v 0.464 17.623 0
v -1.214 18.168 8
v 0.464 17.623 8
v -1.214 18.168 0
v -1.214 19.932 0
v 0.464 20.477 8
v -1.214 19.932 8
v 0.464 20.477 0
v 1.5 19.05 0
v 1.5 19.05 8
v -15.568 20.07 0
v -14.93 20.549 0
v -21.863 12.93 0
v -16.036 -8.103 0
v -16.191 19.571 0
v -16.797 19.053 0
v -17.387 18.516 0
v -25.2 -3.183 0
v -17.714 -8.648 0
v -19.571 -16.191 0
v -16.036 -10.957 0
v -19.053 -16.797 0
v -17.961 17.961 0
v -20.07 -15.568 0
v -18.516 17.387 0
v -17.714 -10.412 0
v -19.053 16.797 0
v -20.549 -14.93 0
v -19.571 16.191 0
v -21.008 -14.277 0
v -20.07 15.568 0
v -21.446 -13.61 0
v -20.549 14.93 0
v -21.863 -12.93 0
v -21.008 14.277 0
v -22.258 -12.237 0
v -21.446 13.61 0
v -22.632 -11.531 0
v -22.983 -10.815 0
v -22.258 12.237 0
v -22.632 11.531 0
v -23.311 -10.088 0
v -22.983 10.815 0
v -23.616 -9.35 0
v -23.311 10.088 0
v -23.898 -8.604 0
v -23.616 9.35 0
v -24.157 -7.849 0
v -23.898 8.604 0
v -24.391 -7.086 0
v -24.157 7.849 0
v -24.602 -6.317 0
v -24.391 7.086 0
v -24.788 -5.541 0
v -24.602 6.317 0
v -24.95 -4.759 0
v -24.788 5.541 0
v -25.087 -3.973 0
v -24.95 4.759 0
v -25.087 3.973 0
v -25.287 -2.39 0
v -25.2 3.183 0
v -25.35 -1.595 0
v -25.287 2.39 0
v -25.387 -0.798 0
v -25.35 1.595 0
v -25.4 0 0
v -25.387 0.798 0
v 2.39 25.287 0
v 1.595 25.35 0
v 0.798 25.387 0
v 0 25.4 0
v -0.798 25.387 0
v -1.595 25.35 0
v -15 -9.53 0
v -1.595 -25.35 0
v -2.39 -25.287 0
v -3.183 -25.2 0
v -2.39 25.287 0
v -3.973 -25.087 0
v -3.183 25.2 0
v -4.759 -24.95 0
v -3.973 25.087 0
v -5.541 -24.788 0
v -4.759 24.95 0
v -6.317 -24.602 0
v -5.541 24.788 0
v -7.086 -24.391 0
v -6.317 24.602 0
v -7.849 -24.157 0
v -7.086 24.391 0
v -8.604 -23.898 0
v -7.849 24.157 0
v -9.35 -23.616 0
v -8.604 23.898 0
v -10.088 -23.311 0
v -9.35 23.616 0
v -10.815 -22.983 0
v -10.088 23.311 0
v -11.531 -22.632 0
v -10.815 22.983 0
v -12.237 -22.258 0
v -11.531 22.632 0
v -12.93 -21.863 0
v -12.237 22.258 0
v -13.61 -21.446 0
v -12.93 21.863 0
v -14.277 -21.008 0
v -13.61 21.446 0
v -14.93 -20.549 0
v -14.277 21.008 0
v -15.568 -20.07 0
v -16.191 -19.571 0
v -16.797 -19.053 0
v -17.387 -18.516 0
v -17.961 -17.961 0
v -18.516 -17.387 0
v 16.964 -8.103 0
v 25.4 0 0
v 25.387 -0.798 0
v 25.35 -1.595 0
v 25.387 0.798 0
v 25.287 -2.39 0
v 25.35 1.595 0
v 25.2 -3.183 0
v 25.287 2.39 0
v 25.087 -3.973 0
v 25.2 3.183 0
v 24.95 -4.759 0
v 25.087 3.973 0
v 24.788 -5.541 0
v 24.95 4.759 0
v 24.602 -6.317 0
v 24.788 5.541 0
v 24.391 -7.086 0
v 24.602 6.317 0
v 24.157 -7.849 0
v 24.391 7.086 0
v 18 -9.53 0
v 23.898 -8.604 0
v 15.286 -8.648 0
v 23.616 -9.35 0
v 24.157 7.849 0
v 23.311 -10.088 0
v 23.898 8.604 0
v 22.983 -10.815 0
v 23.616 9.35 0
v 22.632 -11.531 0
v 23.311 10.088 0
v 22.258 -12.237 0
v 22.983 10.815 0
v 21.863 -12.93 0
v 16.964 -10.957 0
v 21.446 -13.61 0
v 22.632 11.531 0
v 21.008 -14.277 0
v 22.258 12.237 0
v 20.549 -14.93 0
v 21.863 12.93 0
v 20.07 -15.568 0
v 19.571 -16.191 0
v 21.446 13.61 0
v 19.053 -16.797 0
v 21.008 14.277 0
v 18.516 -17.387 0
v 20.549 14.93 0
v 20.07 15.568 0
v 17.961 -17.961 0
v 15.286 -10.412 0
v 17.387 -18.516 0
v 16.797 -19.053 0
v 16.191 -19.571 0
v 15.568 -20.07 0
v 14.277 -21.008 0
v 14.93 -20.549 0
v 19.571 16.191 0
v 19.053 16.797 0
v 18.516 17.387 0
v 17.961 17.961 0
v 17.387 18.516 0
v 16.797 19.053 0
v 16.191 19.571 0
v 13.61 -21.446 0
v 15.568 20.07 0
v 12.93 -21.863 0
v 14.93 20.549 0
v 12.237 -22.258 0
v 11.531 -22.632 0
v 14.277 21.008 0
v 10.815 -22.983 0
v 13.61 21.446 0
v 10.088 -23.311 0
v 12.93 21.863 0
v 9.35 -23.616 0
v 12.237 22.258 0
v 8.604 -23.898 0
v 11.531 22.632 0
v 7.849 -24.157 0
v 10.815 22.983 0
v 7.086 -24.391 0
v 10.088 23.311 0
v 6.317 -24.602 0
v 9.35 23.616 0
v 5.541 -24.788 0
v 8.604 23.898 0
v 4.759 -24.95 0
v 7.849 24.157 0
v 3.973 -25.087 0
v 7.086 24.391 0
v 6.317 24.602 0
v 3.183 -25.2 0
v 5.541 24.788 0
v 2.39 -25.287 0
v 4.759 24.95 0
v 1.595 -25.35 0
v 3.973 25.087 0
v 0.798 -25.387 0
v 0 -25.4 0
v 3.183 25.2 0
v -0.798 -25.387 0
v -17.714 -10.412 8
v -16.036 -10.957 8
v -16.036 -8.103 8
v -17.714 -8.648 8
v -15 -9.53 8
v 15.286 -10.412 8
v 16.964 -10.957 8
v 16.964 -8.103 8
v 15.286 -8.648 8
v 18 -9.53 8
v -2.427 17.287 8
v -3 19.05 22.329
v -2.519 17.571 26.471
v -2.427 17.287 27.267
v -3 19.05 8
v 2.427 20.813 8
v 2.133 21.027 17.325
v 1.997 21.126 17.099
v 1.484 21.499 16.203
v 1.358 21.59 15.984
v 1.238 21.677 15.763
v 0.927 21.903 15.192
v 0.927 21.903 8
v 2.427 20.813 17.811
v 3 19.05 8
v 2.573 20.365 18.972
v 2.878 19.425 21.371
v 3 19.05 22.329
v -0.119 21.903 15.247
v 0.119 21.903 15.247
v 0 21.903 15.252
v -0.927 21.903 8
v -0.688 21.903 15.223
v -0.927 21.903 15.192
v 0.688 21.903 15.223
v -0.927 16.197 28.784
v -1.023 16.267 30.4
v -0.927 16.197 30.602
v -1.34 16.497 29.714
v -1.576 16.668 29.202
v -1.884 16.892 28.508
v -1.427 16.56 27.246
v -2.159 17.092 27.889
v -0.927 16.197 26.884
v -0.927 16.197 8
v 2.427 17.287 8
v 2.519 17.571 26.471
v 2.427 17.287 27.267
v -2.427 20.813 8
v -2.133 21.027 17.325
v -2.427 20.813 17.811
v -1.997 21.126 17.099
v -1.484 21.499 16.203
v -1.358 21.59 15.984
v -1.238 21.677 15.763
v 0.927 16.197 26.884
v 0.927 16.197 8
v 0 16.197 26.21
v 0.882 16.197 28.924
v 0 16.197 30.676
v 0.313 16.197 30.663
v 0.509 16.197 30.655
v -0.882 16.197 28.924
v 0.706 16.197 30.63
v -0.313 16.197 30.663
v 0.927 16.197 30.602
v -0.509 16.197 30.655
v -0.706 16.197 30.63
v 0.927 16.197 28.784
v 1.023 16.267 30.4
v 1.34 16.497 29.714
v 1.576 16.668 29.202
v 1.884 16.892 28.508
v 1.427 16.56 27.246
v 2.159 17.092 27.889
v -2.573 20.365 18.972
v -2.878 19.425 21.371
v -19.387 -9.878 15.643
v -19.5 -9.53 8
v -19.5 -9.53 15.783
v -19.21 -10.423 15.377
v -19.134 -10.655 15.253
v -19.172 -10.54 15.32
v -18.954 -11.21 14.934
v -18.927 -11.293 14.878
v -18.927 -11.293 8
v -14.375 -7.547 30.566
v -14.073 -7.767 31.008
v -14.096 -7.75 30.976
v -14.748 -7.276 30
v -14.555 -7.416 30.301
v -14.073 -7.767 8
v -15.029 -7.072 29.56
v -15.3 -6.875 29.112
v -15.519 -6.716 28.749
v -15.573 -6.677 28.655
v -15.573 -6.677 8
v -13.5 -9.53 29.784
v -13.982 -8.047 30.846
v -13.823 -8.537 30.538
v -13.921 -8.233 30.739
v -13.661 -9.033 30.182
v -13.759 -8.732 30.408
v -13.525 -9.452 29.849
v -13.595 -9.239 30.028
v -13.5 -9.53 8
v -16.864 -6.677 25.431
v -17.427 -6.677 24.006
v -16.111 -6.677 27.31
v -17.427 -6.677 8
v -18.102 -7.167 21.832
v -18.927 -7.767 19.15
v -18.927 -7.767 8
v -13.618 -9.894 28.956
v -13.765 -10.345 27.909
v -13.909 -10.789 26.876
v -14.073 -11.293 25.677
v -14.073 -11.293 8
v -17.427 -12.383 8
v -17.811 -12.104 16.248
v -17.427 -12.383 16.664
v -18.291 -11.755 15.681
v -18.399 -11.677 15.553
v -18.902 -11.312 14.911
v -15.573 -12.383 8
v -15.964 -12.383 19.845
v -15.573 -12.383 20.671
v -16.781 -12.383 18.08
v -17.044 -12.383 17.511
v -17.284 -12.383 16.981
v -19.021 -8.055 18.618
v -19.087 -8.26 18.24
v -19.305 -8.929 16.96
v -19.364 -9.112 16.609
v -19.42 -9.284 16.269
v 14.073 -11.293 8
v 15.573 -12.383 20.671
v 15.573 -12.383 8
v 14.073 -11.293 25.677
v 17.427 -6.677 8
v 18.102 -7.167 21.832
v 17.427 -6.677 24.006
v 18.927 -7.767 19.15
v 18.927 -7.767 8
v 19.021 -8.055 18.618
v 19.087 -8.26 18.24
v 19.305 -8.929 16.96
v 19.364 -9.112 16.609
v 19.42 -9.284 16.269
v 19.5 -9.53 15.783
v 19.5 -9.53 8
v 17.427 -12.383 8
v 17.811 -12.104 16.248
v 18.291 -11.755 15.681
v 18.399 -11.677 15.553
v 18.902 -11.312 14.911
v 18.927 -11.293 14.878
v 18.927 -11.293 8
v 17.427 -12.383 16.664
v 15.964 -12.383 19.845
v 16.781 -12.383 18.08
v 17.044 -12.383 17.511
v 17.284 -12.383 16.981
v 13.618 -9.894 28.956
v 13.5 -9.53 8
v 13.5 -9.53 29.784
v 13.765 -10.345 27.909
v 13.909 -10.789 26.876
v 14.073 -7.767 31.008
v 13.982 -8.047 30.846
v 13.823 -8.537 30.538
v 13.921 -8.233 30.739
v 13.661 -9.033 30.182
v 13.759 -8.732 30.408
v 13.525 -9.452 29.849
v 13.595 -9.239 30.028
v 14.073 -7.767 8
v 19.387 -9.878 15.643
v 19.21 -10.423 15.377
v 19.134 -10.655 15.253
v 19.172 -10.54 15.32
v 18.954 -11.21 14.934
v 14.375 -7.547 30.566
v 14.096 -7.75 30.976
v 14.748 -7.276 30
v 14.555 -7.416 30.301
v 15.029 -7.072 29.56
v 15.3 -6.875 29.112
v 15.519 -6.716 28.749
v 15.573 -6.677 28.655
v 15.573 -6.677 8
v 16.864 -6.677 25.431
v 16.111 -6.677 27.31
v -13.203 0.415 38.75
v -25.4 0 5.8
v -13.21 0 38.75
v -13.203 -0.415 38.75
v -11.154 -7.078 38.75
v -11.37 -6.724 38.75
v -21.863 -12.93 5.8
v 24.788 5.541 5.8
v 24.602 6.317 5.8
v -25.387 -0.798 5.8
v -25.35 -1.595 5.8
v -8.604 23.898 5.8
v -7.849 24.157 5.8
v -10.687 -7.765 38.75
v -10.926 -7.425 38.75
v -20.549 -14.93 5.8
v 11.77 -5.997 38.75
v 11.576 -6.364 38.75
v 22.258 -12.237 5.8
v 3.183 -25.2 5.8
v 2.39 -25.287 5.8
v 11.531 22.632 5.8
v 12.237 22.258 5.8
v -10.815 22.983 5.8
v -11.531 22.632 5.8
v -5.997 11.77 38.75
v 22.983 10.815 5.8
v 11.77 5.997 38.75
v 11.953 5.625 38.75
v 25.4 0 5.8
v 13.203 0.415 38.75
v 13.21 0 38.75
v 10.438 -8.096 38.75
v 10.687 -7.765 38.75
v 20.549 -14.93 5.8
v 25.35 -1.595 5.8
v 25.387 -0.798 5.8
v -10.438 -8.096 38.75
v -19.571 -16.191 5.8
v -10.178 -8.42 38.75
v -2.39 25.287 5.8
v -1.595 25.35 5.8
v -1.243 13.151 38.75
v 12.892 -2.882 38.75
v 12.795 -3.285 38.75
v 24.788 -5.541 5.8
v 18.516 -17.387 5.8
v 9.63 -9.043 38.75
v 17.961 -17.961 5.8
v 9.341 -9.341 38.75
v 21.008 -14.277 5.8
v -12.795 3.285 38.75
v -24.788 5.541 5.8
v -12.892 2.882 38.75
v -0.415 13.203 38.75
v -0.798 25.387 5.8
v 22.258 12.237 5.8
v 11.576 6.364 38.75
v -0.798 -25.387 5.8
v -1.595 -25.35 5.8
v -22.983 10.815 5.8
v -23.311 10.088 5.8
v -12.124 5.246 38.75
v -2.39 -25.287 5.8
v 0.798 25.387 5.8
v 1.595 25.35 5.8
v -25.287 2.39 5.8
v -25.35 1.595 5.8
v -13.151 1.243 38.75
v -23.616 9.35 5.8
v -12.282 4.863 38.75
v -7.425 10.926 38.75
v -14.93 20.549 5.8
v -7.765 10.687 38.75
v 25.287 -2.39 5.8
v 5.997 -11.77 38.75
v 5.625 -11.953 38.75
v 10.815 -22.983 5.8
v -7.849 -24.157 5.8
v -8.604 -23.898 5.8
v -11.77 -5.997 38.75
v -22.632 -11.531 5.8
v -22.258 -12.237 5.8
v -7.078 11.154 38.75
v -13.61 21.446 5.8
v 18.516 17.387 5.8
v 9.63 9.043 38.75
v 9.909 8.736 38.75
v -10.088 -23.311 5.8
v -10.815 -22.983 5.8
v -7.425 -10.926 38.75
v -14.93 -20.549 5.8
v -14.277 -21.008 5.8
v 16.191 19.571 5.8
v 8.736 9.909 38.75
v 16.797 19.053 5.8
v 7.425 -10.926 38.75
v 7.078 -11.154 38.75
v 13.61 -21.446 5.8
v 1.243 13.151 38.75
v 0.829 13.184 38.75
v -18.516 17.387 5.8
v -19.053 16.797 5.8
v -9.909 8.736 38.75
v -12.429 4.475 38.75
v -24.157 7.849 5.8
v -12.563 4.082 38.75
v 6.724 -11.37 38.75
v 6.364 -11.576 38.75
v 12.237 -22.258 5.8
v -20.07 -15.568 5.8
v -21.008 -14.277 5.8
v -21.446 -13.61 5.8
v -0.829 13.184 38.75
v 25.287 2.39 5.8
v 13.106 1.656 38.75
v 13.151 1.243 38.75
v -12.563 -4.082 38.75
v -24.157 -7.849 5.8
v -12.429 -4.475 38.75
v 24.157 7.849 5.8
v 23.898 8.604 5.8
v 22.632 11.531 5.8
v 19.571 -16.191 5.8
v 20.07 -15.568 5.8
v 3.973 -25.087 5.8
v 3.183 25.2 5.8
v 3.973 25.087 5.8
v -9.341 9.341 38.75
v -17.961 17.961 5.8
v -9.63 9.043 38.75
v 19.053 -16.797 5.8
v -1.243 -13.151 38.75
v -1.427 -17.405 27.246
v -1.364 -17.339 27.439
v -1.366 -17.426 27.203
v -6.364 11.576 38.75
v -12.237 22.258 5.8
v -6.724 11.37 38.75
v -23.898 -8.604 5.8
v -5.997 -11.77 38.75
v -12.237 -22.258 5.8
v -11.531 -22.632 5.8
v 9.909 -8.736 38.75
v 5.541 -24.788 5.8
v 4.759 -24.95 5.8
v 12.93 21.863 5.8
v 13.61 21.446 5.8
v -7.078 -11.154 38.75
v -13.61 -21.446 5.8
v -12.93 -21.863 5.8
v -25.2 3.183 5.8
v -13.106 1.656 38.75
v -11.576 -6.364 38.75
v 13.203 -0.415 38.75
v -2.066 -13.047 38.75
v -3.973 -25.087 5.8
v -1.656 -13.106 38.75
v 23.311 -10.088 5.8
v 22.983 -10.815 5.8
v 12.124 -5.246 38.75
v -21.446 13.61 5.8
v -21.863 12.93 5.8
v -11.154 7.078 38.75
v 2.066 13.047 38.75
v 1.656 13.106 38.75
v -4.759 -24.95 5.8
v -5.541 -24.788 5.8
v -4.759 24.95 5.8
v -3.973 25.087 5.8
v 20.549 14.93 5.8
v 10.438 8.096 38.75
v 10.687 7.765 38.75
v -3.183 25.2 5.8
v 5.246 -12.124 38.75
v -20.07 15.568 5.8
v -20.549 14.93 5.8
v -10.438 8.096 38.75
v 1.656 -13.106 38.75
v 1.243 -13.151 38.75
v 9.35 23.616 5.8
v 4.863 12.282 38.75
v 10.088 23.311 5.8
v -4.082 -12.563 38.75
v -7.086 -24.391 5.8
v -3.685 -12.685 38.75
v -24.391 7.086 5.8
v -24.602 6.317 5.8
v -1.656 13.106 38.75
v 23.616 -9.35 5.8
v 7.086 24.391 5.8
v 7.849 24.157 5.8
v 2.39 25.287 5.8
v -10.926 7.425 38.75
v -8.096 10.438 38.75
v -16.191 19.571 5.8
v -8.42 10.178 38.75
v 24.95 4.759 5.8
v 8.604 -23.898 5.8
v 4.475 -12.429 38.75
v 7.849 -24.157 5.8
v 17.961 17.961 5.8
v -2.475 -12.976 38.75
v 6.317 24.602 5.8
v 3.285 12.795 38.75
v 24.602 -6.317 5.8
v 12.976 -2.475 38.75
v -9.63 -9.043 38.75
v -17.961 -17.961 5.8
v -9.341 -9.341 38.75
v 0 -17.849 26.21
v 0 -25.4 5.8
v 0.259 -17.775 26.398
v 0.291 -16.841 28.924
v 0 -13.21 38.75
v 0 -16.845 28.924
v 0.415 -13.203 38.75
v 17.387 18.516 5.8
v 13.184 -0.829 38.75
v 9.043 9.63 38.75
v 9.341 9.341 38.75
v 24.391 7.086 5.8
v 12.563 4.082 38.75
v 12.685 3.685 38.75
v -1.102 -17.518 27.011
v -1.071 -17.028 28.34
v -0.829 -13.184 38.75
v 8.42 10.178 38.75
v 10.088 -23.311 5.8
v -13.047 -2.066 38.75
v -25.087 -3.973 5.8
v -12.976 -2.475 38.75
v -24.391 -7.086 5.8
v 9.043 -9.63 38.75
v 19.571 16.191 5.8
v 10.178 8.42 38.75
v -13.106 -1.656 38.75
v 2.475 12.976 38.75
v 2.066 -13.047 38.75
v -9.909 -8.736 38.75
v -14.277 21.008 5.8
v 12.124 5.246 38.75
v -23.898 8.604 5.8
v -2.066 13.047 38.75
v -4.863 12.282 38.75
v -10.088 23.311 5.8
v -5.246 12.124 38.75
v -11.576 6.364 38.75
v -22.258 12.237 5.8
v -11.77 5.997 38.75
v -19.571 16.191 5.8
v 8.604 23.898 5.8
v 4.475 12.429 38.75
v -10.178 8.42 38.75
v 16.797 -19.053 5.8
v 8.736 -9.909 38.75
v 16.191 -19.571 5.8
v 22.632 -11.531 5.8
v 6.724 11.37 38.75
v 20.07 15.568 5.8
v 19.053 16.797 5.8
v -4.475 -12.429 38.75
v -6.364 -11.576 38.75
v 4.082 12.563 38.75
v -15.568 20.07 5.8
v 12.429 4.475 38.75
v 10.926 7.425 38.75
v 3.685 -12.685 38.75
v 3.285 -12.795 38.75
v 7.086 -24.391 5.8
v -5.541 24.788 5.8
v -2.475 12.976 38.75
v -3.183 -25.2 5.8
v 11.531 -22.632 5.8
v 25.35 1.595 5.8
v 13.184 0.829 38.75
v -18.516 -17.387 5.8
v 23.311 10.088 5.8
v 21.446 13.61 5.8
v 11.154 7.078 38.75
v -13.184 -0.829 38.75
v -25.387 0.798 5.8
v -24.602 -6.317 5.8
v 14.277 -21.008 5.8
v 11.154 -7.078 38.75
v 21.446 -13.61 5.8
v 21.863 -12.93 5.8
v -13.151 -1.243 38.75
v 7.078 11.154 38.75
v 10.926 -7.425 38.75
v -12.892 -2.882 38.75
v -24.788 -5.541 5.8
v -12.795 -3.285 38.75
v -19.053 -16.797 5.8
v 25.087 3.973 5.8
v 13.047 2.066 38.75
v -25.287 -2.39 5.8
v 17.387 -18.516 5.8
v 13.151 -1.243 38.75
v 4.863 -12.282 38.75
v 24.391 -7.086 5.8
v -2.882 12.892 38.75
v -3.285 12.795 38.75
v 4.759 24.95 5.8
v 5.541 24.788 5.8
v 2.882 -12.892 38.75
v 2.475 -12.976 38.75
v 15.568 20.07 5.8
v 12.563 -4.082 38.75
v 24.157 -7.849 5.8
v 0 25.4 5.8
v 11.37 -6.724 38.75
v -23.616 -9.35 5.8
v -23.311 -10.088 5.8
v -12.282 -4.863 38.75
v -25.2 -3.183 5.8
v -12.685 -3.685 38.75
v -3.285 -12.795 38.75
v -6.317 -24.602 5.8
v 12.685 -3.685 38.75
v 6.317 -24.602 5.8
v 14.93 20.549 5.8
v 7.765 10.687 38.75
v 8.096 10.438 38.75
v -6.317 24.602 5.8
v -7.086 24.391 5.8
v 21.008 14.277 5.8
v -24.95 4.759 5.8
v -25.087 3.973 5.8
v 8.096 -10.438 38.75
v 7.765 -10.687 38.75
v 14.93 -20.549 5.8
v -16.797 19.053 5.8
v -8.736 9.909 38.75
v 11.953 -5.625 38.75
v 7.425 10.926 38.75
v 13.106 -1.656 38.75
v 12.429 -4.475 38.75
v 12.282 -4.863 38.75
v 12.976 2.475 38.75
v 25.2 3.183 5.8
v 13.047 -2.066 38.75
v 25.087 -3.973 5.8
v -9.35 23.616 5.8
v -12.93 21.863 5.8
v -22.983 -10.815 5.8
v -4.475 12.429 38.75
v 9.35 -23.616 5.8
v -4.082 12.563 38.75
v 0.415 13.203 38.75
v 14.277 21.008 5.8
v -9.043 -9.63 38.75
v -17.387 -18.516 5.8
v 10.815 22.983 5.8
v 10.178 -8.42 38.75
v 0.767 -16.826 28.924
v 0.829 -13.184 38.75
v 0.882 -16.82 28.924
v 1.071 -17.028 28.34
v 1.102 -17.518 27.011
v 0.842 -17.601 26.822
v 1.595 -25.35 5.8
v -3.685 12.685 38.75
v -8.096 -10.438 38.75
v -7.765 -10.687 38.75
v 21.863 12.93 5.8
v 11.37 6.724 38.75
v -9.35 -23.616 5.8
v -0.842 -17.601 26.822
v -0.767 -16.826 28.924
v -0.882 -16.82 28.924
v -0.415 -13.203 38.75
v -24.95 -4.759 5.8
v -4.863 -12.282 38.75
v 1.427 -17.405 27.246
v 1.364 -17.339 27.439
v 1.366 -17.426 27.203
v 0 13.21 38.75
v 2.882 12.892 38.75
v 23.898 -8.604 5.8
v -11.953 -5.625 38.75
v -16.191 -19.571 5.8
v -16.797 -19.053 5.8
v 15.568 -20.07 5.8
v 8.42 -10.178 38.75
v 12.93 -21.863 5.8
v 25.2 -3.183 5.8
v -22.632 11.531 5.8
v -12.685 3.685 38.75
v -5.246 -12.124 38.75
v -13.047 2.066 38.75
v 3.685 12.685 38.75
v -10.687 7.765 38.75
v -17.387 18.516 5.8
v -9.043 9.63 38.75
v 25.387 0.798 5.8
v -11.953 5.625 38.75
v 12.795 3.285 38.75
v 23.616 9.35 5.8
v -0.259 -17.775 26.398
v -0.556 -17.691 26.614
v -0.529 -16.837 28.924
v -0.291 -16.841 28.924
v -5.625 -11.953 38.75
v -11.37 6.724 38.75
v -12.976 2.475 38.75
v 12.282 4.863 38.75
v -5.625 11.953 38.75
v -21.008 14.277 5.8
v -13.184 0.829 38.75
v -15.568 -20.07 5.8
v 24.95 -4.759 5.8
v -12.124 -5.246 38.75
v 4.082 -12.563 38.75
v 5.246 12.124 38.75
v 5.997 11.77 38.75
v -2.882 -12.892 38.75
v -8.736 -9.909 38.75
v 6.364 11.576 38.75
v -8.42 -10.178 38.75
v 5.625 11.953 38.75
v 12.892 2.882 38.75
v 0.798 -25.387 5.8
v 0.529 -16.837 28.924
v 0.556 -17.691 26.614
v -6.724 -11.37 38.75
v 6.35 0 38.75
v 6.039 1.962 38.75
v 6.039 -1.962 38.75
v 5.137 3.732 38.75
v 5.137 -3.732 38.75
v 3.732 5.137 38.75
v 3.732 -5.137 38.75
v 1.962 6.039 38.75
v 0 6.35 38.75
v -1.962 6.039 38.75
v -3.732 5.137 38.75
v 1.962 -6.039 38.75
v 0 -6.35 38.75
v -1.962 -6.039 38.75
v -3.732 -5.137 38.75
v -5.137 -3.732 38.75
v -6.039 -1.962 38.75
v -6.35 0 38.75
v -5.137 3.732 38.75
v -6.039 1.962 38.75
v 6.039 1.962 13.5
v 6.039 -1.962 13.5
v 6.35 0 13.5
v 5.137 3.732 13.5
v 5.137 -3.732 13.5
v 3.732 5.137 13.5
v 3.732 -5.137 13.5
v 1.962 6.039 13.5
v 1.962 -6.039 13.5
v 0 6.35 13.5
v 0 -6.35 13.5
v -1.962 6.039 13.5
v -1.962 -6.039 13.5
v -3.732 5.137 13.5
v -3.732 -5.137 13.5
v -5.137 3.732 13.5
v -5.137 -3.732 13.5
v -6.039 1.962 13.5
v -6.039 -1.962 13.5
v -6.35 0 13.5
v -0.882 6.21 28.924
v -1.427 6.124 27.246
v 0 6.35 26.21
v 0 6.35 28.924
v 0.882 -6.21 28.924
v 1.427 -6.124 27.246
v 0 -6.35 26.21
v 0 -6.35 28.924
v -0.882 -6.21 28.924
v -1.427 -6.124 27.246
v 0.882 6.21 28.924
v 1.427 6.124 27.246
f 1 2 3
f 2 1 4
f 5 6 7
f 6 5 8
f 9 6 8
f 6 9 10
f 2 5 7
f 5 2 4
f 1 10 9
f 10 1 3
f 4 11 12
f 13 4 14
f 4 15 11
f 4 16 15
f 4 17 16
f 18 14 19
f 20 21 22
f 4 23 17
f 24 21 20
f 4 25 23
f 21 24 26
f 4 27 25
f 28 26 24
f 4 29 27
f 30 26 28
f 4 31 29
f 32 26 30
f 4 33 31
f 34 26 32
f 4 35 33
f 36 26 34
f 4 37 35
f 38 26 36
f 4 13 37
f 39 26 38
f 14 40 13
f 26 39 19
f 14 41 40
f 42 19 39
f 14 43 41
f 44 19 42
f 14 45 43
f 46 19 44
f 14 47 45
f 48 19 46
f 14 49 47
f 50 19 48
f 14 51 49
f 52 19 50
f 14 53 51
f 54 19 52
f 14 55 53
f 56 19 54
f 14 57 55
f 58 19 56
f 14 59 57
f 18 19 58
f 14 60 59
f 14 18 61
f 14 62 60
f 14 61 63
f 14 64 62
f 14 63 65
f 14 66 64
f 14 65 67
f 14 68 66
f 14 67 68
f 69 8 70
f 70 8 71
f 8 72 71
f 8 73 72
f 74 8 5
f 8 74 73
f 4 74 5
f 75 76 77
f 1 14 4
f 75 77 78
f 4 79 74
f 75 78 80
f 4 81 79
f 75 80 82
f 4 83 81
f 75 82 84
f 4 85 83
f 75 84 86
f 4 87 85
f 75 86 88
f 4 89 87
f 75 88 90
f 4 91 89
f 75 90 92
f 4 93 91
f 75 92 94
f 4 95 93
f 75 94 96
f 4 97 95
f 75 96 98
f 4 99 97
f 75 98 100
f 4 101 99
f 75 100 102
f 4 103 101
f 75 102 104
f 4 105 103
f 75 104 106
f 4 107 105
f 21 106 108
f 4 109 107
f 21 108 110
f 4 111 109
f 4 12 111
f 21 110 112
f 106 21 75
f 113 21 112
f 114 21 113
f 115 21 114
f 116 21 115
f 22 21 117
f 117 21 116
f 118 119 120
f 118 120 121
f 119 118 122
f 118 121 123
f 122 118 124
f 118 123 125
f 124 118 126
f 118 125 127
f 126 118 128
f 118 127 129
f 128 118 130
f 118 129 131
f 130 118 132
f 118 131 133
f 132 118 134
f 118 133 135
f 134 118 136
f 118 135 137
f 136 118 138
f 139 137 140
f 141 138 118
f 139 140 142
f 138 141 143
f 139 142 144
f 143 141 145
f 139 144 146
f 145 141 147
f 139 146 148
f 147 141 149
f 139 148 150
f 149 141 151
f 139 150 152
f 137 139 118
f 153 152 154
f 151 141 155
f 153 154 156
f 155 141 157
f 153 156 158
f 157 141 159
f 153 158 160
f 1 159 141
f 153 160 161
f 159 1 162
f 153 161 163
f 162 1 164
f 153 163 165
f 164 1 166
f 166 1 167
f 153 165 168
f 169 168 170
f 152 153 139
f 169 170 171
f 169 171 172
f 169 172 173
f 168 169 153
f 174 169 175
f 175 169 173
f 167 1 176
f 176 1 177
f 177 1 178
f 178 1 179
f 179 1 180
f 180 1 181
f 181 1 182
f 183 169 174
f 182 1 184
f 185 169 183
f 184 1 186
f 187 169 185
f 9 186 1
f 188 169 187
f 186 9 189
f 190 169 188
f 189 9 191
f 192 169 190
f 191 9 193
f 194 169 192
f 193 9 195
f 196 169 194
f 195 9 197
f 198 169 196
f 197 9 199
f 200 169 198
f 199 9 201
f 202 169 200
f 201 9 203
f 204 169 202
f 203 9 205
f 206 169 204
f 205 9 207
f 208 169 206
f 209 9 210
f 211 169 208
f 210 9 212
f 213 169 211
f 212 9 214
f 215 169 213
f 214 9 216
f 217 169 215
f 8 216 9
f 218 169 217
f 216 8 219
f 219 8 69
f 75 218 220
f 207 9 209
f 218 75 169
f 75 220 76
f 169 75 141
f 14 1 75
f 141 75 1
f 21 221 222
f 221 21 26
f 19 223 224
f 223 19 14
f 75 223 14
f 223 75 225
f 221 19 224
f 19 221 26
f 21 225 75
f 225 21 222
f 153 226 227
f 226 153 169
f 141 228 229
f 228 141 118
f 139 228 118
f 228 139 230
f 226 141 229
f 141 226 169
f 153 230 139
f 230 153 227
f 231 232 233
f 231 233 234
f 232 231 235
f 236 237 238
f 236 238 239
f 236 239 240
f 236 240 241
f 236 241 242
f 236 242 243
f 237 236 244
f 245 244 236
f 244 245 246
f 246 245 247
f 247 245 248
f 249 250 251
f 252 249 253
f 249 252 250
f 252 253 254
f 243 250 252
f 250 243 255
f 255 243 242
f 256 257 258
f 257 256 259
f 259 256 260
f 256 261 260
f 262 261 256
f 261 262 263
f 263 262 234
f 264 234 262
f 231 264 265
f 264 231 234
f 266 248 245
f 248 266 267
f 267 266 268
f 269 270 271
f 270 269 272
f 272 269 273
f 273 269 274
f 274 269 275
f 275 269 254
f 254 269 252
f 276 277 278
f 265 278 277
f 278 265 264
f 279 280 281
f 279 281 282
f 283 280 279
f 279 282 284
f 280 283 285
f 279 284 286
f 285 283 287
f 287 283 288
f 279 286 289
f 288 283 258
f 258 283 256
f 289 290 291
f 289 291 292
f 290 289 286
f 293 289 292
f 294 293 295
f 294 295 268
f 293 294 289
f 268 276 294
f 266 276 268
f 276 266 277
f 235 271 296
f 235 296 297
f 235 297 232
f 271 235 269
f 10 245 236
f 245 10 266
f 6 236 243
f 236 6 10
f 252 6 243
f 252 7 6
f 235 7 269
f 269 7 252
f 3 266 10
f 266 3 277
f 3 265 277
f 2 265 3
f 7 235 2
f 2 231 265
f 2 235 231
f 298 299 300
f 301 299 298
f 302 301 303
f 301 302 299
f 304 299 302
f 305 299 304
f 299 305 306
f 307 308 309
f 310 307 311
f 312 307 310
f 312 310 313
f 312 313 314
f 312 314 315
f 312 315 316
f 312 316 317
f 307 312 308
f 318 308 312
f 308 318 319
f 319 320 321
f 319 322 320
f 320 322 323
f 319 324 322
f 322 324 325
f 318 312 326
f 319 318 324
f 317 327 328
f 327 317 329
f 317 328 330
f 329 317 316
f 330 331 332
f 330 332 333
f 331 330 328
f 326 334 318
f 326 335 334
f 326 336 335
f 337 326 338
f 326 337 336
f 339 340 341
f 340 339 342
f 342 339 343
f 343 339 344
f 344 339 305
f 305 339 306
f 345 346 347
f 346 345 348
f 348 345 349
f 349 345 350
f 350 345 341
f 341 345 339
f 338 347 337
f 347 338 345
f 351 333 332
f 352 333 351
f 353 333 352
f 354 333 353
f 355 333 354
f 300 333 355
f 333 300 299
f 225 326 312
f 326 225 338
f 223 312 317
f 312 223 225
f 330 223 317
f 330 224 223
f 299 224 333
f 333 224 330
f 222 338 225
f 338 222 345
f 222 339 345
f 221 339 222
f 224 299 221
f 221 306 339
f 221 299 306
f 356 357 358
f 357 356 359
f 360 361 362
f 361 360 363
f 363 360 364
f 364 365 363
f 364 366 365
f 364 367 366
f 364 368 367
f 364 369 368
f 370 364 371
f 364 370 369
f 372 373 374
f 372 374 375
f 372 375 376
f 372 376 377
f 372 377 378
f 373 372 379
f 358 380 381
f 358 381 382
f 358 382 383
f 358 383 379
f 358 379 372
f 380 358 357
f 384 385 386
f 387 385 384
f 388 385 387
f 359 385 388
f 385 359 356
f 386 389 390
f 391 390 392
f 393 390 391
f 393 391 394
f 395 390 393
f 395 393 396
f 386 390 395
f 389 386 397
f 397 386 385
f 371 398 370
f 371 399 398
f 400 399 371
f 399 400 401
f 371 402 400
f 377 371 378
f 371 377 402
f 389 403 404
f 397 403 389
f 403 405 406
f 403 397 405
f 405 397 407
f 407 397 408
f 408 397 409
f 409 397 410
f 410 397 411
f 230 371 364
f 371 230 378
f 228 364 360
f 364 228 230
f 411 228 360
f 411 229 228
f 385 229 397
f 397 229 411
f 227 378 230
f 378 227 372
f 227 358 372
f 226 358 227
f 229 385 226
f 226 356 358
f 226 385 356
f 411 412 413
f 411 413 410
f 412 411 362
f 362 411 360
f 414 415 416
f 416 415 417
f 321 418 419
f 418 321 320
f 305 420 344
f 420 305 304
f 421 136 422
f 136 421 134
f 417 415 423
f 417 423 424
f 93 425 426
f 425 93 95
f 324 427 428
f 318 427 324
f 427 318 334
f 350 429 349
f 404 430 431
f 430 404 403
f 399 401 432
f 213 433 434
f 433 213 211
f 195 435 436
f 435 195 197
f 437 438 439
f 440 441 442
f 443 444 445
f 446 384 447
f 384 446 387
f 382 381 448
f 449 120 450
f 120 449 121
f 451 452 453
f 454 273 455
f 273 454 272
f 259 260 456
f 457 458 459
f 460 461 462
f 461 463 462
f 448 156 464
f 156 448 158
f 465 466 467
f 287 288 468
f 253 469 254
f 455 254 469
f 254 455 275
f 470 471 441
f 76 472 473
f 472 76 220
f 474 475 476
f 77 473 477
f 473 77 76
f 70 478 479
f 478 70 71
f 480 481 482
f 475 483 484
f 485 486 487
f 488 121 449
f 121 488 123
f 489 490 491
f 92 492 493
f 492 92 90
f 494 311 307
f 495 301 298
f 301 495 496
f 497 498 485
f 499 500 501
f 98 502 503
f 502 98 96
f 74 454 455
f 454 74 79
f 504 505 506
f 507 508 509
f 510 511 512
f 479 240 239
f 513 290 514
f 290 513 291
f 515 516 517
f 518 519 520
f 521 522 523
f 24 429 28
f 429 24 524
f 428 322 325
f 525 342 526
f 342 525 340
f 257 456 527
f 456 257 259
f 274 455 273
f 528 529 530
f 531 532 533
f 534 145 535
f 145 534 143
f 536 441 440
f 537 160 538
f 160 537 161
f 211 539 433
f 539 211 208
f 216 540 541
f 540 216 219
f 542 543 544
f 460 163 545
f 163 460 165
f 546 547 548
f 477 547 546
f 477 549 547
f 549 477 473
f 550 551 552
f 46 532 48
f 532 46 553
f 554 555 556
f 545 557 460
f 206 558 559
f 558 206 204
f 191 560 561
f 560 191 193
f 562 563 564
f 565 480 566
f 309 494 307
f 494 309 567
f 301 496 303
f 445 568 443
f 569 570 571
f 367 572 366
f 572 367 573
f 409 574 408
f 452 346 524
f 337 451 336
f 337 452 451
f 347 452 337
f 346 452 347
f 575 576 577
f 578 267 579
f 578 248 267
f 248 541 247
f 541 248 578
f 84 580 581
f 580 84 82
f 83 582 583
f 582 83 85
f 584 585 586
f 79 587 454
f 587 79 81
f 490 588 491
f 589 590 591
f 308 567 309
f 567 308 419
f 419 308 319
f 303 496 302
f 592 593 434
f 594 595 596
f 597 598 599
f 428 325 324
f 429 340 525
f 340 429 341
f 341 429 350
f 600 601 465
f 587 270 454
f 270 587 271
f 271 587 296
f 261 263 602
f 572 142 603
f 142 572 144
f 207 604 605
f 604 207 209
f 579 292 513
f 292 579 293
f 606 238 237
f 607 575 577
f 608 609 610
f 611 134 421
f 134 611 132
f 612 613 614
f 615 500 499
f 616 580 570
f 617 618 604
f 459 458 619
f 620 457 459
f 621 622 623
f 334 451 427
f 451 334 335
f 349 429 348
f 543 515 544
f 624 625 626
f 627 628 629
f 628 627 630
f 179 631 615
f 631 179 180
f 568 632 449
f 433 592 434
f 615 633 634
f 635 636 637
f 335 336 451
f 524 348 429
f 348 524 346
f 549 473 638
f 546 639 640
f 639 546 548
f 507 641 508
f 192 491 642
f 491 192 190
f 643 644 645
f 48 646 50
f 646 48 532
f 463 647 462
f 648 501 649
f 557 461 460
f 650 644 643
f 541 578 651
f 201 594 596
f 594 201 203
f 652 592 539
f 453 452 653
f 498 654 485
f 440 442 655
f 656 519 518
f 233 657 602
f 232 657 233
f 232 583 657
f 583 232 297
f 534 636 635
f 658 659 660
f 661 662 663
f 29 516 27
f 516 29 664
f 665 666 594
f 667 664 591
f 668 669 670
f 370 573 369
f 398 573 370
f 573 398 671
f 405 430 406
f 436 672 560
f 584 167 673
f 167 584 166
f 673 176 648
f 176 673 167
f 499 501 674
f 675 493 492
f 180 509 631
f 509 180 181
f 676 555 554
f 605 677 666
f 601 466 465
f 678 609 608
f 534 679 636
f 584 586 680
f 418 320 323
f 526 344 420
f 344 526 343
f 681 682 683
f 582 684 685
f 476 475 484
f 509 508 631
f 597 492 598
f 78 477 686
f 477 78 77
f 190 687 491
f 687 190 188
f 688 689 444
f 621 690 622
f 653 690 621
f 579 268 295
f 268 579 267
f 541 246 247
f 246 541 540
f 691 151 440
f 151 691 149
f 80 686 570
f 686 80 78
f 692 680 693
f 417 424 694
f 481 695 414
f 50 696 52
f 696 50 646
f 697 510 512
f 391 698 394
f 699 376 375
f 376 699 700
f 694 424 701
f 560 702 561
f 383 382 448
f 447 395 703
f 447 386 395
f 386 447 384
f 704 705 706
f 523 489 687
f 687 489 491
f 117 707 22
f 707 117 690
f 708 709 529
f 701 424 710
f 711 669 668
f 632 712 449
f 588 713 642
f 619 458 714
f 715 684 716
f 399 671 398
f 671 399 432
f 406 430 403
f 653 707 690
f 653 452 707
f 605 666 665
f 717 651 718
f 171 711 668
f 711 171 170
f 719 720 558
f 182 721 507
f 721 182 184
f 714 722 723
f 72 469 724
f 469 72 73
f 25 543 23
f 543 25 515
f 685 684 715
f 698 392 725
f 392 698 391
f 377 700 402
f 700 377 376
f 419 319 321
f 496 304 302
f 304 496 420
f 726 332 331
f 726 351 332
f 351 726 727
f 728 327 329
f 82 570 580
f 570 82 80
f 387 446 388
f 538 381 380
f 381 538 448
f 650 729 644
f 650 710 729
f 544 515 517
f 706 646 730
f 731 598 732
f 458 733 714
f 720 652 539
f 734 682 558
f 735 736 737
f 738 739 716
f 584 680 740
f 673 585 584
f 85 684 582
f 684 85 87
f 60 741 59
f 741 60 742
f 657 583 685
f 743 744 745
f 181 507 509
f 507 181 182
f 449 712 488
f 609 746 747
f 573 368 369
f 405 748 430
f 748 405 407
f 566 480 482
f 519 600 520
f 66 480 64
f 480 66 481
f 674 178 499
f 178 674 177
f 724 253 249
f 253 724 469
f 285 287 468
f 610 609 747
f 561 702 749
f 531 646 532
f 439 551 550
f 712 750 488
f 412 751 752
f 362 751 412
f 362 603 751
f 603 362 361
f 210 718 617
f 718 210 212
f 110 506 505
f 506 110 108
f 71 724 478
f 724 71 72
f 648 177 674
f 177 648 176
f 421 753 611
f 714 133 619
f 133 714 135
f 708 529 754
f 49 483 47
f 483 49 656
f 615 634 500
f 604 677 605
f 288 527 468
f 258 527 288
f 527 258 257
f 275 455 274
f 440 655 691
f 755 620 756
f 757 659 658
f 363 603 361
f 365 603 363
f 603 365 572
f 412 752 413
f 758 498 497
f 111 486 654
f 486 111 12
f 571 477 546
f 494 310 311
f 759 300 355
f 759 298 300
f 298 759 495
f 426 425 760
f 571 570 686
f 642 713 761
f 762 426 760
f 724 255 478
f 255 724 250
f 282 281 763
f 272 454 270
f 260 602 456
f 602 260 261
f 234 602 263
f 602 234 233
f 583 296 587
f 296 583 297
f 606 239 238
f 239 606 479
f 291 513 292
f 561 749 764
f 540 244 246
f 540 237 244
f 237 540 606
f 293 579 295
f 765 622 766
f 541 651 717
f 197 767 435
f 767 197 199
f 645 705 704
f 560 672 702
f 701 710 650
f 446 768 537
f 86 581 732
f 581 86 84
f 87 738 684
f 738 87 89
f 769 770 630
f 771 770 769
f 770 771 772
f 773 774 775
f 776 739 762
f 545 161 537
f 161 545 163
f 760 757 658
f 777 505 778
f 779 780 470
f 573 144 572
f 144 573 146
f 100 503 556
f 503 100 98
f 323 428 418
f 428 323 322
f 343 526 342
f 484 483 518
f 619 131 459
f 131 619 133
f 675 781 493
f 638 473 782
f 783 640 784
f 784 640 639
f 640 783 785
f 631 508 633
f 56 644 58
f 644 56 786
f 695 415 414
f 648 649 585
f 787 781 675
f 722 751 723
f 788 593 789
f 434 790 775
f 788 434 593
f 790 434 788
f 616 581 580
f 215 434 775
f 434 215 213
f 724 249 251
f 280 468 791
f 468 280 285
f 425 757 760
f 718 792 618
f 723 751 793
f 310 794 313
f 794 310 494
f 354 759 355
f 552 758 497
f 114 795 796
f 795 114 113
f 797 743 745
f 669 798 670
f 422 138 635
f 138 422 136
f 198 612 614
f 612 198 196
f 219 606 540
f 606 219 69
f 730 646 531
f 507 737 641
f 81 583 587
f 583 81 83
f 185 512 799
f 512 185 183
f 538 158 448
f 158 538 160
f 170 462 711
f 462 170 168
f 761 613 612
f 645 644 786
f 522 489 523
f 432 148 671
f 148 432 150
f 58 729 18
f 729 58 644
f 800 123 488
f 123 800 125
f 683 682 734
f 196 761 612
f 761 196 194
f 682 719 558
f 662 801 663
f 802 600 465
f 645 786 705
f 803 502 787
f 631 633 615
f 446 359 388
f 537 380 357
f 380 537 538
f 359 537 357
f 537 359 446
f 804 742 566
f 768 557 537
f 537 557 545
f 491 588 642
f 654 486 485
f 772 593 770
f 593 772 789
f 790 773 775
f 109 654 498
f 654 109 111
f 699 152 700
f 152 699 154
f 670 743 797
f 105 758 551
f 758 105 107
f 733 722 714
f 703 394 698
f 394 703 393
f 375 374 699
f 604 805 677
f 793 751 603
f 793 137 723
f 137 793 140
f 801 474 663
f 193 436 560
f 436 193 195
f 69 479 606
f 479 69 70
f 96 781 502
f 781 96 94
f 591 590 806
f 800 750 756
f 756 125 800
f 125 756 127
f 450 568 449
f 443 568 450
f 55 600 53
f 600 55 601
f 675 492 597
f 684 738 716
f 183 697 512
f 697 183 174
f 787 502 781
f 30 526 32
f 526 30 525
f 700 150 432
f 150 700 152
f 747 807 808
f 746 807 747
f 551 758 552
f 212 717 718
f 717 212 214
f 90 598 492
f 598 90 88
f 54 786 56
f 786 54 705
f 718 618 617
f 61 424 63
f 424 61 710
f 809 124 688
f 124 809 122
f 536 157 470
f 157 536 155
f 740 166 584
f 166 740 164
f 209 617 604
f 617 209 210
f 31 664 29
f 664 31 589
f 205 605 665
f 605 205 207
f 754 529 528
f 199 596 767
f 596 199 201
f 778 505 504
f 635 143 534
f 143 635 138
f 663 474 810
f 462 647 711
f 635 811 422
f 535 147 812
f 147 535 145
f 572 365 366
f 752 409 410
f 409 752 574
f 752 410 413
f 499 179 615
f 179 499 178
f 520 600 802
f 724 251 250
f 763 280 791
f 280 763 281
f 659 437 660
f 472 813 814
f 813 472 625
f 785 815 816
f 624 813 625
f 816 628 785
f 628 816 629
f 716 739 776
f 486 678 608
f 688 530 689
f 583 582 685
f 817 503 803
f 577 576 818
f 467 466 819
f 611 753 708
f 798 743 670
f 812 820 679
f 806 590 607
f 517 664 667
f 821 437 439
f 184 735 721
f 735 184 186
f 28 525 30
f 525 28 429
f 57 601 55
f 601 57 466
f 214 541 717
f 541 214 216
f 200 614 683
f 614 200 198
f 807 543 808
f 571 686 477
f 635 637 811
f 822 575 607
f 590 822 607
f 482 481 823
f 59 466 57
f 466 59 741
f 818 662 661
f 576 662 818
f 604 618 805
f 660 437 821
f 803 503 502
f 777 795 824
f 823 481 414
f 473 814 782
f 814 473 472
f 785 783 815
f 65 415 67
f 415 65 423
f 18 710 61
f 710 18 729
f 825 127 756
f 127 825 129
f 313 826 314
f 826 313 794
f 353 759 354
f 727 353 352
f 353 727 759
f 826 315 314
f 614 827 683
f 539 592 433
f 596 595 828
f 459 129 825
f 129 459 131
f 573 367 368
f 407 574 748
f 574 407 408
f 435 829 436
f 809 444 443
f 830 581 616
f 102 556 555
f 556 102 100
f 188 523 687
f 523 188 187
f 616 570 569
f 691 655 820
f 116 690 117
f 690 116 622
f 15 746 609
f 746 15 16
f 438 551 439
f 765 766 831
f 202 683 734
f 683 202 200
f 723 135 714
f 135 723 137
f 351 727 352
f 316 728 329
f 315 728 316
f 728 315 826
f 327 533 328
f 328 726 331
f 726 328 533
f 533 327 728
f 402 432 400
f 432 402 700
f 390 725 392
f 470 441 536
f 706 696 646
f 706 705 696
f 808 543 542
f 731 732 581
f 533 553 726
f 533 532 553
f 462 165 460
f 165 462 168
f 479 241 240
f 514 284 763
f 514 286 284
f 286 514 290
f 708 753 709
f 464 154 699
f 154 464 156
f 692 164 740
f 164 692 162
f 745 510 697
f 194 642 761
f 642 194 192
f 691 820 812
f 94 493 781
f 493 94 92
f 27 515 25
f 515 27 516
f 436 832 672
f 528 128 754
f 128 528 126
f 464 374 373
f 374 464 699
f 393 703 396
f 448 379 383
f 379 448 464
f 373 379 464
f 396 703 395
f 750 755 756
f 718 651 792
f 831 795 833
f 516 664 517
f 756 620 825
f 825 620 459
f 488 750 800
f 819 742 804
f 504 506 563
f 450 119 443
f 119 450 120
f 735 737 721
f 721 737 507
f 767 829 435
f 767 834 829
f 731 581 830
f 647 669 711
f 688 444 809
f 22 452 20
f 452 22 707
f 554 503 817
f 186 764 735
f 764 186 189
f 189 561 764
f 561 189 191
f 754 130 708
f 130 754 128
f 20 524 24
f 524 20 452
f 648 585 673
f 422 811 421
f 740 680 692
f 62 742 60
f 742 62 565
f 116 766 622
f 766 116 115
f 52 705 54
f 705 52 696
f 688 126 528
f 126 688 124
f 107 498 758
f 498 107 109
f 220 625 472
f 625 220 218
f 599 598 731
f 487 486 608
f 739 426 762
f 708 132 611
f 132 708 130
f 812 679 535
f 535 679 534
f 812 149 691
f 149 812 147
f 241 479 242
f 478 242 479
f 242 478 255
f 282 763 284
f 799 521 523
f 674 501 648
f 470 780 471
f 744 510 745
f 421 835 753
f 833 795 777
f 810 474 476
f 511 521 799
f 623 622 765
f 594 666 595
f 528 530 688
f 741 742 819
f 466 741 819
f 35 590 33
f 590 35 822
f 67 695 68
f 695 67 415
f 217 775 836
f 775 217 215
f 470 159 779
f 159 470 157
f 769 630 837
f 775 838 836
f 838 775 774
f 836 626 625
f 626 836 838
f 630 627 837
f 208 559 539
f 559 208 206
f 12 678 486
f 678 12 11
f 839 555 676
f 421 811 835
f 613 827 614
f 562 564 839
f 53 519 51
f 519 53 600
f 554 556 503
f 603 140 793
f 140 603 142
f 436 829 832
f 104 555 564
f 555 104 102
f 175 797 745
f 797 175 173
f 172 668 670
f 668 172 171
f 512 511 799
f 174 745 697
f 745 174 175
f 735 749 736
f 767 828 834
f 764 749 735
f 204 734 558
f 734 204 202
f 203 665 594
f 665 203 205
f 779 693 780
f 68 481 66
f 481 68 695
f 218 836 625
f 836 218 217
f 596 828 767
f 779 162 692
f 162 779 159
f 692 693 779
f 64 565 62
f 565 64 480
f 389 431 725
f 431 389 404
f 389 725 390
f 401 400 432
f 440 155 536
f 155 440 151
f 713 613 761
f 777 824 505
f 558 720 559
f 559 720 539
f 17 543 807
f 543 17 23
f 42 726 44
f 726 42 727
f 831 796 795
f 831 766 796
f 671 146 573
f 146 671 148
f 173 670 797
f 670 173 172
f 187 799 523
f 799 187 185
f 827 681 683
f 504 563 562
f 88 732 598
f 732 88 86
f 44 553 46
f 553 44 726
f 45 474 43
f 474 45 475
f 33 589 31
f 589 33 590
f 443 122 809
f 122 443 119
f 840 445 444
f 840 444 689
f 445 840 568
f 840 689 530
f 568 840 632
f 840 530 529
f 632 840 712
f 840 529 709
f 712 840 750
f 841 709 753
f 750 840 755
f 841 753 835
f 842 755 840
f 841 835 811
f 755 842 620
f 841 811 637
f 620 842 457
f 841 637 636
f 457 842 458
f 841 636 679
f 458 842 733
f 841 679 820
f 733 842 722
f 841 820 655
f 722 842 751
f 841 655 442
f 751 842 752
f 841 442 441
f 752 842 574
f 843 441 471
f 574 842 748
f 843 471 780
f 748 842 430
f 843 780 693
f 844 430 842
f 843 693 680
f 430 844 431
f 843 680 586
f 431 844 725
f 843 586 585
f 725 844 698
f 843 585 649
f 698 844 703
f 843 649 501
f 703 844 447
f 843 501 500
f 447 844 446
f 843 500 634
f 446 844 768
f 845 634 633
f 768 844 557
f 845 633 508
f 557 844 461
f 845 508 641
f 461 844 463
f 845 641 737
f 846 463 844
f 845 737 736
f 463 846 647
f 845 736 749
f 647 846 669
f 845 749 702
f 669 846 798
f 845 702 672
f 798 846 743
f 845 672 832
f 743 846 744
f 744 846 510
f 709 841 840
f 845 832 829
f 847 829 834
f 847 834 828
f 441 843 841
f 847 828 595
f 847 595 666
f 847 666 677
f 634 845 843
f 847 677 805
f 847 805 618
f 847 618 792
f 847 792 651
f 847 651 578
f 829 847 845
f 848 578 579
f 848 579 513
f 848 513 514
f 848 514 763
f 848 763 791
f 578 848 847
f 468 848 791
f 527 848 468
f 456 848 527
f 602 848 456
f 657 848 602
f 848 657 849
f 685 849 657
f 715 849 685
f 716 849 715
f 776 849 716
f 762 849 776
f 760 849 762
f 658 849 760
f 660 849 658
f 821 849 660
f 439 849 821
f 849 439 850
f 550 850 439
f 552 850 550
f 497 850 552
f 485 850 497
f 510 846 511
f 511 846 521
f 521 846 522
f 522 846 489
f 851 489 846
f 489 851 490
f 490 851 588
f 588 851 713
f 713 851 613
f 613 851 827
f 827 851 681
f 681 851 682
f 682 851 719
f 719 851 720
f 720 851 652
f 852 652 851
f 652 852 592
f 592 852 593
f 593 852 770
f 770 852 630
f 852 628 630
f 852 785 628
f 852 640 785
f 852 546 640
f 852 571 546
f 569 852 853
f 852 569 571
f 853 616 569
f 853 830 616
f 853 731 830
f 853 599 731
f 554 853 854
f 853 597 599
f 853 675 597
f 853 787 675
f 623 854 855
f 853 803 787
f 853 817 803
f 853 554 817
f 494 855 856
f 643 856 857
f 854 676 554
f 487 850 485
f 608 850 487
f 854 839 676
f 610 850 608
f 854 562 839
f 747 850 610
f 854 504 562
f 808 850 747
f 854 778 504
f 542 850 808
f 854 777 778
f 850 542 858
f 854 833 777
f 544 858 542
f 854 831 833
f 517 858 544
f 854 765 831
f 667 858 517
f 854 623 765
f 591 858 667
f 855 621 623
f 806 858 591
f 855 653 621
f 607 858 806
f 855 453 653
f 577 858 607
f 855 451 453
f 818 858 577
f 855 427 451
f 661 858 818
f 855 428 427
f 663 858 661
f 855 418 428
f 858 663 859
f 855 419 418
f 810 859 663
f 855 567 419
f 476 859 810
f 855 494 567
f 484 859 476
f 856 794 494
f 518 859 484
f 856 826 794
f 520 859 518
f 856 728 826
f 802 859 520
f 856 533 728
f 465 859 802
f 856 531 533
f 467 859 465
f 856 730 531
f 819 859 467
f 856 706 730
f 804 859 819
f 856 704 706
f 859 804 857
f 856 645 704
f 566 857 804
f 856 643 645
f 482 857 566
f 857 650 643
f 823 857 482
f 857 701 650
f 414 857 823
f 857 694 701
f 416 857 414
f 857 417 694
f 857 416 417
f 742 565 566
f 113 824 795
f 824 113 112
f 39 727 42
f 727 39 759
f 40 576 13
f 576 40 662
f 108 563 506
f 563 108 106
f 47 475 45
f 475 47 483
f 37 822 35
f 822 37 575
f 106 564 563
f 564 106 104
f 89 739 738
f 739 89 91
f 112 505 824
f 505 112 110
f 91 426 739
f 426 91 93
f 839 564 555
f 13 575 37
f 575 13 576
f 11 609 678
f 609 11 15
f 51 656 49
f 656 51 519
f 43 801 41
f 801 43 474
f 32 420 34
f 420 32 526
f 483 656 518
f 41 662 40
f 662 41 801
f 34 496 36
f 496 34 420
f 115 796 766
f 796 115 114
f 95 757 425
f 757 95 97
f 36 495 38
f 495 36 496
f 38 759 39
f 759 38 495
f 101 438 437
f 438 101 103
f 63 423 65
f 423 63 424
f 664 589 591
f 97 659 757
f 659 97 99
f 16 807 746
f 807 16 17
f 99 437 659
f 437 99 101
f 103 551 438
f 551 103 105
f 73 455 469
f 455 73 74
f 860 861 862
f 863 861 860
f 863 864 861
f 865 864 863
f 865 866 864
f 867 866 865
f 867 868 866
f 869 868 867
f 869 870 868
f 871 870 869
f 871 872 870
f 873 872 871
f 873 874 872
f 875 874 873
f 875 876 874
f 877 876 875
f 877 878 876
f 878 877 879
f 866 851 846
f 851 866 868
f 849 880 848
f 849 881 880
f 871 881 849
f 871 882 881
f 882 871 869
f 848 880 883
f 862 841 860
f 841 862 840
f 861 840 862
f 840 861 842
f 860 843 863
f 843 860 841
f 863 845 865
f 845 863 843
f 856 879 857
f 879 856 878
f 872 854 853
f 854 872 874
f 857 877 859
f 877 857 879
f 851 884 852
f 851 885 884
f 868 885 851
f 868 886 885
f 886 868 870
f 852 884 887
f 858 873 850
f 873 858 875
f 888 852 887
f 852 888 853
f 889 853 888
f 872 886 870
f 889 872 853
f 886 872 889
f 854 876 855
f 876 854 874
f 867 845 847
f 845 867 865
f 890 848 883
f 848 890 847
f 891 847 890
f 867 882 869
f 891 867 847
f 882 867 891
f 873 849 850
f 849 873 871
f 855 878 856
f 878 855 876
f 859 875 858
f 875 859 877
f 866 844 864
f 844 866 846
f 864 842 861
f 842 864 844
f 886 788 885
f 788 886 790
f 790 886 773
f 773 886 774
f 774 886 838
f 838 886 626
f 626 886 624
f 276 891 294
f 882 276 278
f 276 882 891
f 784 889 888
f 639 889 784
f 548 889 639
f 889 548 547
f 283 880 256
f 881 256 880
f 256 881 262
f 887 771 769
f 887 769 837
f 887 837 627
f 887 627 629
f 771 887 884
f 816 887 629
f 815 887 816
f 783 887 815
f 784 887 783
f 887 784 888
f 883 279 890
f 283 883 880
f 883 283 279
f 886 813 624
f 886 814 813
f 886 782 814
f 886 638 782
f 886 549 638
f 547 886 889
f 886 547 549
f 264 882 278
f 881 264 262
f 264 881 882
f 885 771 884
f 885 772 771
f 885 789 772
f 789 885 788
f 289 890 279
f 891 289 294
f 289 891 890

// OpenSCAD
// - Screw Diameter (mm) (default=3)
screwsize = 3; //[3,4,5]
// - Counter Bore Diameter (mm) (default = 6)
cbsize = 6; //[6,8,9]
// Rubber Rod Diameter (mm) (default = 12.70)
rubberdia = 12.70; //[6:25.4]
// Base Diameter (mm) (default = 25.4)
basedia = 25.4; //[25.4:40]
module mainbodyextrusion(){
    rotate_extrude($fn=200) polygon( points=[[0,0],[0,38.75],[13.21,38.75],[basedia,5.80],[basedia,0]] );
}
 
module mountingscrewholes (){
    translate([0,19.05,0]) cylinder(h=50,r1=screwsize/2,r2=screwsize/2); 
    translate([-16.50,-9.530,0]) cylinder(h=50,r1=screwsize/2,r2=screwsize/2);
    translate([16.50,-9.530,0]) cylinder(h=50,r1=screwsize/2,r2=screwsize/2);
}
module mountingscrewcb (){
    translate([0,19.05,8]) cylinder(h=50,r1=cbsize/2,r2=cbsize/2); 
    translate([-16.50,-9.530,8]) cylinder(h=50,r1=cbsize/2,r2=cbsize/2);
    translate([16.50,-9.530,8]) cylinder(h=50,r1=cbsize/2,r2=cbsize/2);
}
module rubbercb () {
    translate([0,0,13.5]) cylinder(h=35,r1=rubberdia/2,r2=rubberdia/2);
}
module horizontalbolt (){
     translate([0,25,27.71])rotate([90,90,0])cylinder(h=50,r1=screwsize/2,r2=screwsize/2);
}
difference (){
    mainbodyextrusion ();
    mountingscrewholes();
    mountingscrewcb();
    rubbercb();
    horizontalbolt();
}
